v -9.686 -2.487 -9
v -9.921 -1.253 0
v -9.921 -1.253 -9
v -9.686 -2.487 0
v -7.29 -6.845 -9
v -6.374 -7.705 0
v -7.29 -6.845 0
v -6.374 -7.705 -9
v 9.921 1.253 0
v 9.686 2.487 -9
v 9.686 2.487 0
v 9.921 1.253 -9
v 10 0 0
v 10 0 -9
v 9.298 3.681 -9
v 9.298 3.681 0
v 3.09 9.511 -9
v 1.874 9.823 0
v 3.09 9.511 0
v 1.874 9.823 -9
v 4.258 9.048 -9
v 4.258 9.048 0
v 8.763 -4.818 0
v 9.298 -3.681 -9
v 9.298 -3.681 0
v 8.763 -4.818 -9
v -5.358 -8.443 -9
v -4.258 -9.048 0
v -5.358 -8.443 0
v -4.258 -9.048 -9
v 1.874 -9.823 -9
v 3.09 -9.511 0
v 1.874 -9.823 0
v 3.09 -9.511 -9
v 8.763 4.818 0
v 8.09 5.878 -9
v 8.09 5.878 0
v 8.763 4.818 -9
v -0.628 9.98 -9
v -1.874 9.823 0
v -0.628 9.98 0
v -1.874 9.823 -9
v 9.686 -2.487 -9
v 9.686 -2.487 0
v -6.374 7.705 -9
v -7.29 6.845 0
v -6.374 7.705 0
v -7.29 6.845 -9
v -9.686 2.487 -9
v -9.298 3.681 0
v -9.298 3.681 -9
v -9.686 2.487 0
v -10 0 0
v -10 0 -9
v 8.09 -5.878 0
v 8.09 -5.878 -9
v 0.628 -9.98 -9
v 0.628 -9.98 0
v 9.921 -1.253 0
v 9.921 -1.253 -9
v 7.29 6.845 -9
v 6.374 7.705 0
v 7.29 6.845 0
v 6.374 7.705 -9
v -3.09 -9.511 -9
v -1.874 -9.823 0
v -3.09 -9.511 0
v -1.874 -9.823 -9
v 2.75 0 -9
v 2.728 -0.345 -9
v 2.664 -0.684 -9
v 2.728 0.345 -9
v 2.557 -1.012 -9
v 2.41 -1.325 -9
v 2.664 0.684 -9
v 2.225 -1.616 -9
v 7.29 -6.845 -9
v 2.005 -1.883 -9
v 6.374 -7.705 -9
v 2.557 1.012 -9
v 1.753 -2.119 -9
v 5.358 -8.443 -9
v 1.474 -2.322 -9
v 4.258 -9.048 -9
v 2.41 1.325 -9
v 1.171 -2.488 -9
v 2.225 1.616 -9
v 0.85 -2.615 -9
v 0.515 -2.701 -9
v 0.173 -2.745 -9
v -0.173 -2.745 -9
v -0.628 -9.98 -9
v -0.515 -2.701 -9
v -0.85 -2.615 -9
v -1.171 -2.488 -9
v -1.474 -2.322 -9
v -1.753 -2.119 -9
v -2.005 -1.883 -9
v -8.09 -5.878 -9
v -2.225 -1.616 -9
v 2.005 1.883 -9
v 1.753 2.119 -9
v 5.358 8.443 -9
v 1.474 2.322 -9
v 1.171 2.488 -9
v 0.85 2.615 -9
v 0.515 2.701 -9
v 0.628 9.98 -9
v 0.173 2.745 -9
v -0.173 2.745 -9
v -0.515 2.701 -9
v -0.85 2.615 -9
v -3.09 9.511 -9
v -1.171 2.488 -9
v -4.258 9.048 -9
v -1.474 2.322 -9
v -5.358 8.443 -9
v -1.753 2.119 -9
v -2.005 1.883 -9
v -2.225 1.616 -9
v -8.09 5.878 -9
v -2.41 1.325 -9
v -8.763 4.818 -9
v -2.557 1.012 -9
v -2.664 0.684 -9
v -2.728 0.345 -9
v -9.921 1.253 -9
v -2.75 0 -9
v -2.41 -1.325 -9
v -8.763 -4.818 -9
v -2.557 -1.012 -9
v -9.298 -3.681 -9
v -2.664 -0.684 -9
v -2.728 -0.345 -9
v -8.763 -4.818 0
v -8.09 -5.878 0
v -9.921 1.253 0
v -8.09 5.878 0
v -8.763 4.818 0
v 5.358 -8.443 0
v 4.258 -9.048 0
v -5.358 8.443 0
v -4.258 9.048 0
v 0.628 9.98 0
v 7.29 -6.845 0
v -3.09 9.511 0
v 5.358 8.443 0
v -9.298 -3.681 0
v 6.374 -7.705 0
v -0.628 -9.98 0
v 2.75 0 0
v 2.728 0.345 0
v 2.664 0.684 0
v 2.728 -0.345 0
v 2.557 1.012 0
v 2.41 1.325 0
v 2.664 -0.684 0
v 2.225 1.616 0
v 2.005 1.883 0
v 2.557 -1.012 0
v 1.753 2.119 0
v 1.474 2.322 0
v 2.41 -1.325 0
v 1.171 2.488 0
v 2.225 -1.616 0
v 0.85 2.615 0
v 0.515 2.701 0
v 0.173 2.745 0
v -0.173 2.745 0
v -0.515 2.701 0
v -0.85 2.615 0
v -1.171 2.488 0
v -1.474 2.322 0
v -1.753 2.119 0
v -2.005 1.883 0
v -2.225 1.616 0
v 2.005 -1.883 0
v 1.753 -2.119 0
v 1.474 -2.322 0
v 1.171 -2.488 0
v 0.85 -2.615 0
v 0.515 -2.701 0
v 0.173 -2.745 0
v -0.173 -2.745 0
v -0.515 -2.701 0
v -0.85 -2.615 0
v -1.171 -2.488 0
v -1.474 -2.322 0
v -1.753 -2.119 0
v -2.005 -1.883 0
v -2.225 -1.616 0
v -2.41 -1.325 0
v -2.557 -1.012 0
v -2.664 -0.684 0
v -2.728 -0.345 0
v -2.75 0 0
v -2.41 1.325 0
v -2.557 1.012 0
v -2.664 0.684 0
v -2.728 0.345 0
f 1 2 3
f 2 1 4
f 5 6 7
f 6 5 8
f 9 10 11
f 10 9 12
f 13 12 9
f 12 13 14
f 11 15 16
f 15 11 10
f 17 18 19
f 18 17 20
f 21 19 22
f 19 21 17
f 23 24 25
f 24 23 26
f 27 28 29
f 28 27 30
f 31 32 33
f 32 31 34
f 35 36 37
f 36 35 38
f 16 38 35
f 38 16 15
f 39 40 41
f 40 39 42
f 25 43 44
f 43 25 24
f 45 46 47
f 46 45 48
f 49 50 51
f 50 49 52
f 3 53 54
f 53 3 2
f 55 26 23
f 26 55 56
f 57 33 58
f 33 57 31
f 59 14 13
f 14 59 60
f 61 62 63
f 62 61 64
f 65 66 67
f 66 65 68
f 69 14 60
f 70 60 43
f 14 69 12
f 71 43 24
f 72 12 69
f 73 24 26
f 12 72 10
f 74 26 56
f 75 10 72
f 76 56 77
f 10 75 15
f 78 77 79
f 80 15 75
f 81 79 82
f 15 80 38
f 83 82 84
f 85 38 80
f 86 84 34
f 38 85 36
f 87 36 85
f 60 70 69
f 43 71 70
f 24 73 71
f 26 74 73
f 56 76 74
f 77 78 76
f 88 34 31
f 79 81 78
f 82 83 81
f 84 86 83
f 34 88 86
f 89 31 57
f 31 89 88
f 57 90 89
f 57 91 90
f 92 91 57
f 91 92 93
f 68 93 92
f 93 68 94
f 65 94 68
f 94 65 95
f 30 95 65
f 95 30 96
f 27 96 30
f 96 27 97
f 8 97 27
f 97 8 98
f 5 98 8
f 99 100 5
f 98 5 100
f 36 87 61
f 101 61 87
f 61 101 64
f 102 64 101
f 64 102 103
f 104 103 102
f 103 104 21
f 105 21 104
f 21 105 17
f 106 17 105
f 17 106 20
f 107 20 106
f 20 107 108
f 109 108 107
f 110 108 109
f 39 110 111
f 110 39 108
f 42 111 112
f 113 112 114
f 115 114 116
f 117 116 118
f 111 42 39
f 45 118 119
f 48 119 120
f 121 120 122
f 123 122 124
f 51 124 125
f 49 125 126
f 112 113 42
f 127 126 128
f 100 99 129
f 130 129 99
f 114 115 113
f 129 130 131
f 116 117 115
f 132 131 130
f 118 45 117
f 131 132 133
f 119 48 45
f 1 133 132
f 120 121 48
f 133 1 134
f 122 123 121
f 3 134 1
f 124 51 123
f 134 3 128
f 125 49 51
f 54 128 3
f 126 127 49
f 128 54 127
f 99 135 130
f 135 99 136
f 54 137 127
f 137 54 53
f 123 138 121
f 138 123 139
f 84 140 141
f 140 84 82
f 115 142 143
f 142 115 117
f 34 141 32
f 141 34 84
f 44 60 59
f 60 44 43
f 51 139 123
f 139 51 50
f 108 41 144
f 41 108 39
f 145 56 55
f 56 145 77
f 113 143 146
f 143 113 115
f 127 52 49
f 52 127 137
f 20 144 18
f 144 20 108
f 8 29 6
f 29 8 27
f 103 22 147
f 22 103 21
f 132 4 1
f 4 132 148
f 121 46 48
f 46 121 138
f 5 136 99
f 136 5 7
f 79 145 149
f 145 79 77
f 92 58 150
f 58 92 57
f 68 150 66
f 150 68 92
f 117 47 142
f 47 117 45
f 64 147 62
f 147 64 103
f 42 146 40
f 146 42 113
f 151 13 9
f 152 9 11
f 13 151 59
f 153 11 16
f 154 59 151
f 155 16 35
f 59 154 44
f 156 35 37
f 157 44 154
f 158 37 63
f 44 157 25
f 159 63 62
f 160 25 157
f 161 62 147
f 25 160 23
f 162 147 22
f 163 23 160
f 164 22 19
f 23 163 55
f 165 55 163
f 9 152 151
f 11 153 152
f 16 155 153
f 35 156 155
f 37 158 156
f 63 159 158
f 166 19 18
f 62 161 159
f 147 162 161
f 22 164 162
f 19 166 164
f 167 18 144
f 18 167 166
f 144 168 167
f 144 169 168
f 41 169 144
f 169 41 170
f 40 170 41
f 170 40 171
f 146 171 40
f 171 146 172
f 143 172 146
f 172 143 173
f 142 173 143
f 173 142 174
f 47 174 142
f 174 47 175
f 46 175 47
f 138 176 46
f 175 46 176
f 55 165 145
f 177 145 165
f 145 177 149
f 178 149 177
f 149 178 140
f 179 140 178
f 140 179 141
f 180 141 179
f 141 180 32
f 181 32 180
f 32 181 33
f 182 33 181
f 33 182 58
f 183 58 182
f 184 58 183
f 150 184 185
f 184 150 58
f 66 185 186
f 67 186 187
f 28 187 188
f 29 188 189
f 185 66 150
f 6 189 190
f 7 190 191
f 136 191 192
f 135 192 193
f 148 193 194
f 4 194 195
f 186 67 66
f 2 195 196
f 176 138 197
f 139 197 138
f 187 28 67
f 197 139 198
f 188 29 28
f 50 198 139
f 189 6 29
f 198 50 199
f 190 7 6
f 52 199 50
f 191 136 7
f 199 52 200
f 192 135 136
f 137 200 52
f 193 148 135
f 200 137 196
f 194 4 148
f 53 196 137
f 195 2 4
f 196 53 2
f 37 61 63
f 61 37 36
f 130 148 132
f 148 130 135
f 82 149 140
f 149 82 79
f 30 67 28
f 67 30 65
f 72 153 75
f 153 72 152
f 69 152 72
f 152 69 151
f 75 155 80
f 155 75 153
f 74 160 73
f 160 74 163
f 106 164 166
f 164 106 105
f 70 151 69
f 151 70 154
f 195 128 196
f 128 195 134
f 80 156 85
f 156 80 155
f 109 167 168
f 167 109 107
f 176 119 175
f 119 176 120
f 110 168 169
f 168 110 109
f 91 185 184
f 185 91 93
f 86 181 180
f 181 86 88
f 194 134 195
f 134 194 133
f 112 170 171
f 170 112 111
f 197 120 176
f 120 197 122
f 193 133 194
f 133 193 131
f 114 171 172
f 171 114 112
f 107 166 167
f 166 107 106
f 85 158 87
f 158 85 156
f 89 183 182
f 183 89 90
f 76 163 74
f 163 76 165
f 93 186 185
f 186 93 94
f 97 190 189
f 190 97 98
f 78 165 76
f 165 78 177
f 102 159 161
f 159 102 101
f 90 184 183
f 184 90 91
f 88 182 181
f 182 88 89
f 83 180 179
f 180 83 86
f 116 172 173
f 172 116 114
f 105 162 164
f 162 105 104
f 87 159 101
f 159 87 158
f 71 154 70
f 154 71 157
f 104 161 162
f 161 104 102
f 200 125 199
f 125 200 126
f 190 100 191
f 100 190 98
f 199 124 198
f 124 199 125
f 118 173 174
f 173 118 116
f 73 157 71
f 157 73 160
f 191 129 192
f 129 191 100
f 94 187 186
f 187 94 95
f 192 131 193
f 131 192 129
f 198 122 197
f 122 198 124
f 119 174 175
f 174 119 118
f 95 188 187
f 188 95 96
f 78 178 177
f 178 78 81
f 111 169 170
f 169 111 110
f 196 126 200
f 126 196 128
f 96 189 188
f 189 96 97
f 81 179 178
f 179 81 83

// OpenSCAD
$fn = 50;


difference() {
	union() {
		translate(v = [0, 0, -9.0000000000]) {
			cylinder(h = 9, r = 10.0000000000);
		}
		cylinder(h = 0, r = 16.0000000000);
	}
	union() {
		#translate(v = [0, 0, -9]) {
			cylinder(h = 9, r = 2.7500000000);
		}
	}
}
